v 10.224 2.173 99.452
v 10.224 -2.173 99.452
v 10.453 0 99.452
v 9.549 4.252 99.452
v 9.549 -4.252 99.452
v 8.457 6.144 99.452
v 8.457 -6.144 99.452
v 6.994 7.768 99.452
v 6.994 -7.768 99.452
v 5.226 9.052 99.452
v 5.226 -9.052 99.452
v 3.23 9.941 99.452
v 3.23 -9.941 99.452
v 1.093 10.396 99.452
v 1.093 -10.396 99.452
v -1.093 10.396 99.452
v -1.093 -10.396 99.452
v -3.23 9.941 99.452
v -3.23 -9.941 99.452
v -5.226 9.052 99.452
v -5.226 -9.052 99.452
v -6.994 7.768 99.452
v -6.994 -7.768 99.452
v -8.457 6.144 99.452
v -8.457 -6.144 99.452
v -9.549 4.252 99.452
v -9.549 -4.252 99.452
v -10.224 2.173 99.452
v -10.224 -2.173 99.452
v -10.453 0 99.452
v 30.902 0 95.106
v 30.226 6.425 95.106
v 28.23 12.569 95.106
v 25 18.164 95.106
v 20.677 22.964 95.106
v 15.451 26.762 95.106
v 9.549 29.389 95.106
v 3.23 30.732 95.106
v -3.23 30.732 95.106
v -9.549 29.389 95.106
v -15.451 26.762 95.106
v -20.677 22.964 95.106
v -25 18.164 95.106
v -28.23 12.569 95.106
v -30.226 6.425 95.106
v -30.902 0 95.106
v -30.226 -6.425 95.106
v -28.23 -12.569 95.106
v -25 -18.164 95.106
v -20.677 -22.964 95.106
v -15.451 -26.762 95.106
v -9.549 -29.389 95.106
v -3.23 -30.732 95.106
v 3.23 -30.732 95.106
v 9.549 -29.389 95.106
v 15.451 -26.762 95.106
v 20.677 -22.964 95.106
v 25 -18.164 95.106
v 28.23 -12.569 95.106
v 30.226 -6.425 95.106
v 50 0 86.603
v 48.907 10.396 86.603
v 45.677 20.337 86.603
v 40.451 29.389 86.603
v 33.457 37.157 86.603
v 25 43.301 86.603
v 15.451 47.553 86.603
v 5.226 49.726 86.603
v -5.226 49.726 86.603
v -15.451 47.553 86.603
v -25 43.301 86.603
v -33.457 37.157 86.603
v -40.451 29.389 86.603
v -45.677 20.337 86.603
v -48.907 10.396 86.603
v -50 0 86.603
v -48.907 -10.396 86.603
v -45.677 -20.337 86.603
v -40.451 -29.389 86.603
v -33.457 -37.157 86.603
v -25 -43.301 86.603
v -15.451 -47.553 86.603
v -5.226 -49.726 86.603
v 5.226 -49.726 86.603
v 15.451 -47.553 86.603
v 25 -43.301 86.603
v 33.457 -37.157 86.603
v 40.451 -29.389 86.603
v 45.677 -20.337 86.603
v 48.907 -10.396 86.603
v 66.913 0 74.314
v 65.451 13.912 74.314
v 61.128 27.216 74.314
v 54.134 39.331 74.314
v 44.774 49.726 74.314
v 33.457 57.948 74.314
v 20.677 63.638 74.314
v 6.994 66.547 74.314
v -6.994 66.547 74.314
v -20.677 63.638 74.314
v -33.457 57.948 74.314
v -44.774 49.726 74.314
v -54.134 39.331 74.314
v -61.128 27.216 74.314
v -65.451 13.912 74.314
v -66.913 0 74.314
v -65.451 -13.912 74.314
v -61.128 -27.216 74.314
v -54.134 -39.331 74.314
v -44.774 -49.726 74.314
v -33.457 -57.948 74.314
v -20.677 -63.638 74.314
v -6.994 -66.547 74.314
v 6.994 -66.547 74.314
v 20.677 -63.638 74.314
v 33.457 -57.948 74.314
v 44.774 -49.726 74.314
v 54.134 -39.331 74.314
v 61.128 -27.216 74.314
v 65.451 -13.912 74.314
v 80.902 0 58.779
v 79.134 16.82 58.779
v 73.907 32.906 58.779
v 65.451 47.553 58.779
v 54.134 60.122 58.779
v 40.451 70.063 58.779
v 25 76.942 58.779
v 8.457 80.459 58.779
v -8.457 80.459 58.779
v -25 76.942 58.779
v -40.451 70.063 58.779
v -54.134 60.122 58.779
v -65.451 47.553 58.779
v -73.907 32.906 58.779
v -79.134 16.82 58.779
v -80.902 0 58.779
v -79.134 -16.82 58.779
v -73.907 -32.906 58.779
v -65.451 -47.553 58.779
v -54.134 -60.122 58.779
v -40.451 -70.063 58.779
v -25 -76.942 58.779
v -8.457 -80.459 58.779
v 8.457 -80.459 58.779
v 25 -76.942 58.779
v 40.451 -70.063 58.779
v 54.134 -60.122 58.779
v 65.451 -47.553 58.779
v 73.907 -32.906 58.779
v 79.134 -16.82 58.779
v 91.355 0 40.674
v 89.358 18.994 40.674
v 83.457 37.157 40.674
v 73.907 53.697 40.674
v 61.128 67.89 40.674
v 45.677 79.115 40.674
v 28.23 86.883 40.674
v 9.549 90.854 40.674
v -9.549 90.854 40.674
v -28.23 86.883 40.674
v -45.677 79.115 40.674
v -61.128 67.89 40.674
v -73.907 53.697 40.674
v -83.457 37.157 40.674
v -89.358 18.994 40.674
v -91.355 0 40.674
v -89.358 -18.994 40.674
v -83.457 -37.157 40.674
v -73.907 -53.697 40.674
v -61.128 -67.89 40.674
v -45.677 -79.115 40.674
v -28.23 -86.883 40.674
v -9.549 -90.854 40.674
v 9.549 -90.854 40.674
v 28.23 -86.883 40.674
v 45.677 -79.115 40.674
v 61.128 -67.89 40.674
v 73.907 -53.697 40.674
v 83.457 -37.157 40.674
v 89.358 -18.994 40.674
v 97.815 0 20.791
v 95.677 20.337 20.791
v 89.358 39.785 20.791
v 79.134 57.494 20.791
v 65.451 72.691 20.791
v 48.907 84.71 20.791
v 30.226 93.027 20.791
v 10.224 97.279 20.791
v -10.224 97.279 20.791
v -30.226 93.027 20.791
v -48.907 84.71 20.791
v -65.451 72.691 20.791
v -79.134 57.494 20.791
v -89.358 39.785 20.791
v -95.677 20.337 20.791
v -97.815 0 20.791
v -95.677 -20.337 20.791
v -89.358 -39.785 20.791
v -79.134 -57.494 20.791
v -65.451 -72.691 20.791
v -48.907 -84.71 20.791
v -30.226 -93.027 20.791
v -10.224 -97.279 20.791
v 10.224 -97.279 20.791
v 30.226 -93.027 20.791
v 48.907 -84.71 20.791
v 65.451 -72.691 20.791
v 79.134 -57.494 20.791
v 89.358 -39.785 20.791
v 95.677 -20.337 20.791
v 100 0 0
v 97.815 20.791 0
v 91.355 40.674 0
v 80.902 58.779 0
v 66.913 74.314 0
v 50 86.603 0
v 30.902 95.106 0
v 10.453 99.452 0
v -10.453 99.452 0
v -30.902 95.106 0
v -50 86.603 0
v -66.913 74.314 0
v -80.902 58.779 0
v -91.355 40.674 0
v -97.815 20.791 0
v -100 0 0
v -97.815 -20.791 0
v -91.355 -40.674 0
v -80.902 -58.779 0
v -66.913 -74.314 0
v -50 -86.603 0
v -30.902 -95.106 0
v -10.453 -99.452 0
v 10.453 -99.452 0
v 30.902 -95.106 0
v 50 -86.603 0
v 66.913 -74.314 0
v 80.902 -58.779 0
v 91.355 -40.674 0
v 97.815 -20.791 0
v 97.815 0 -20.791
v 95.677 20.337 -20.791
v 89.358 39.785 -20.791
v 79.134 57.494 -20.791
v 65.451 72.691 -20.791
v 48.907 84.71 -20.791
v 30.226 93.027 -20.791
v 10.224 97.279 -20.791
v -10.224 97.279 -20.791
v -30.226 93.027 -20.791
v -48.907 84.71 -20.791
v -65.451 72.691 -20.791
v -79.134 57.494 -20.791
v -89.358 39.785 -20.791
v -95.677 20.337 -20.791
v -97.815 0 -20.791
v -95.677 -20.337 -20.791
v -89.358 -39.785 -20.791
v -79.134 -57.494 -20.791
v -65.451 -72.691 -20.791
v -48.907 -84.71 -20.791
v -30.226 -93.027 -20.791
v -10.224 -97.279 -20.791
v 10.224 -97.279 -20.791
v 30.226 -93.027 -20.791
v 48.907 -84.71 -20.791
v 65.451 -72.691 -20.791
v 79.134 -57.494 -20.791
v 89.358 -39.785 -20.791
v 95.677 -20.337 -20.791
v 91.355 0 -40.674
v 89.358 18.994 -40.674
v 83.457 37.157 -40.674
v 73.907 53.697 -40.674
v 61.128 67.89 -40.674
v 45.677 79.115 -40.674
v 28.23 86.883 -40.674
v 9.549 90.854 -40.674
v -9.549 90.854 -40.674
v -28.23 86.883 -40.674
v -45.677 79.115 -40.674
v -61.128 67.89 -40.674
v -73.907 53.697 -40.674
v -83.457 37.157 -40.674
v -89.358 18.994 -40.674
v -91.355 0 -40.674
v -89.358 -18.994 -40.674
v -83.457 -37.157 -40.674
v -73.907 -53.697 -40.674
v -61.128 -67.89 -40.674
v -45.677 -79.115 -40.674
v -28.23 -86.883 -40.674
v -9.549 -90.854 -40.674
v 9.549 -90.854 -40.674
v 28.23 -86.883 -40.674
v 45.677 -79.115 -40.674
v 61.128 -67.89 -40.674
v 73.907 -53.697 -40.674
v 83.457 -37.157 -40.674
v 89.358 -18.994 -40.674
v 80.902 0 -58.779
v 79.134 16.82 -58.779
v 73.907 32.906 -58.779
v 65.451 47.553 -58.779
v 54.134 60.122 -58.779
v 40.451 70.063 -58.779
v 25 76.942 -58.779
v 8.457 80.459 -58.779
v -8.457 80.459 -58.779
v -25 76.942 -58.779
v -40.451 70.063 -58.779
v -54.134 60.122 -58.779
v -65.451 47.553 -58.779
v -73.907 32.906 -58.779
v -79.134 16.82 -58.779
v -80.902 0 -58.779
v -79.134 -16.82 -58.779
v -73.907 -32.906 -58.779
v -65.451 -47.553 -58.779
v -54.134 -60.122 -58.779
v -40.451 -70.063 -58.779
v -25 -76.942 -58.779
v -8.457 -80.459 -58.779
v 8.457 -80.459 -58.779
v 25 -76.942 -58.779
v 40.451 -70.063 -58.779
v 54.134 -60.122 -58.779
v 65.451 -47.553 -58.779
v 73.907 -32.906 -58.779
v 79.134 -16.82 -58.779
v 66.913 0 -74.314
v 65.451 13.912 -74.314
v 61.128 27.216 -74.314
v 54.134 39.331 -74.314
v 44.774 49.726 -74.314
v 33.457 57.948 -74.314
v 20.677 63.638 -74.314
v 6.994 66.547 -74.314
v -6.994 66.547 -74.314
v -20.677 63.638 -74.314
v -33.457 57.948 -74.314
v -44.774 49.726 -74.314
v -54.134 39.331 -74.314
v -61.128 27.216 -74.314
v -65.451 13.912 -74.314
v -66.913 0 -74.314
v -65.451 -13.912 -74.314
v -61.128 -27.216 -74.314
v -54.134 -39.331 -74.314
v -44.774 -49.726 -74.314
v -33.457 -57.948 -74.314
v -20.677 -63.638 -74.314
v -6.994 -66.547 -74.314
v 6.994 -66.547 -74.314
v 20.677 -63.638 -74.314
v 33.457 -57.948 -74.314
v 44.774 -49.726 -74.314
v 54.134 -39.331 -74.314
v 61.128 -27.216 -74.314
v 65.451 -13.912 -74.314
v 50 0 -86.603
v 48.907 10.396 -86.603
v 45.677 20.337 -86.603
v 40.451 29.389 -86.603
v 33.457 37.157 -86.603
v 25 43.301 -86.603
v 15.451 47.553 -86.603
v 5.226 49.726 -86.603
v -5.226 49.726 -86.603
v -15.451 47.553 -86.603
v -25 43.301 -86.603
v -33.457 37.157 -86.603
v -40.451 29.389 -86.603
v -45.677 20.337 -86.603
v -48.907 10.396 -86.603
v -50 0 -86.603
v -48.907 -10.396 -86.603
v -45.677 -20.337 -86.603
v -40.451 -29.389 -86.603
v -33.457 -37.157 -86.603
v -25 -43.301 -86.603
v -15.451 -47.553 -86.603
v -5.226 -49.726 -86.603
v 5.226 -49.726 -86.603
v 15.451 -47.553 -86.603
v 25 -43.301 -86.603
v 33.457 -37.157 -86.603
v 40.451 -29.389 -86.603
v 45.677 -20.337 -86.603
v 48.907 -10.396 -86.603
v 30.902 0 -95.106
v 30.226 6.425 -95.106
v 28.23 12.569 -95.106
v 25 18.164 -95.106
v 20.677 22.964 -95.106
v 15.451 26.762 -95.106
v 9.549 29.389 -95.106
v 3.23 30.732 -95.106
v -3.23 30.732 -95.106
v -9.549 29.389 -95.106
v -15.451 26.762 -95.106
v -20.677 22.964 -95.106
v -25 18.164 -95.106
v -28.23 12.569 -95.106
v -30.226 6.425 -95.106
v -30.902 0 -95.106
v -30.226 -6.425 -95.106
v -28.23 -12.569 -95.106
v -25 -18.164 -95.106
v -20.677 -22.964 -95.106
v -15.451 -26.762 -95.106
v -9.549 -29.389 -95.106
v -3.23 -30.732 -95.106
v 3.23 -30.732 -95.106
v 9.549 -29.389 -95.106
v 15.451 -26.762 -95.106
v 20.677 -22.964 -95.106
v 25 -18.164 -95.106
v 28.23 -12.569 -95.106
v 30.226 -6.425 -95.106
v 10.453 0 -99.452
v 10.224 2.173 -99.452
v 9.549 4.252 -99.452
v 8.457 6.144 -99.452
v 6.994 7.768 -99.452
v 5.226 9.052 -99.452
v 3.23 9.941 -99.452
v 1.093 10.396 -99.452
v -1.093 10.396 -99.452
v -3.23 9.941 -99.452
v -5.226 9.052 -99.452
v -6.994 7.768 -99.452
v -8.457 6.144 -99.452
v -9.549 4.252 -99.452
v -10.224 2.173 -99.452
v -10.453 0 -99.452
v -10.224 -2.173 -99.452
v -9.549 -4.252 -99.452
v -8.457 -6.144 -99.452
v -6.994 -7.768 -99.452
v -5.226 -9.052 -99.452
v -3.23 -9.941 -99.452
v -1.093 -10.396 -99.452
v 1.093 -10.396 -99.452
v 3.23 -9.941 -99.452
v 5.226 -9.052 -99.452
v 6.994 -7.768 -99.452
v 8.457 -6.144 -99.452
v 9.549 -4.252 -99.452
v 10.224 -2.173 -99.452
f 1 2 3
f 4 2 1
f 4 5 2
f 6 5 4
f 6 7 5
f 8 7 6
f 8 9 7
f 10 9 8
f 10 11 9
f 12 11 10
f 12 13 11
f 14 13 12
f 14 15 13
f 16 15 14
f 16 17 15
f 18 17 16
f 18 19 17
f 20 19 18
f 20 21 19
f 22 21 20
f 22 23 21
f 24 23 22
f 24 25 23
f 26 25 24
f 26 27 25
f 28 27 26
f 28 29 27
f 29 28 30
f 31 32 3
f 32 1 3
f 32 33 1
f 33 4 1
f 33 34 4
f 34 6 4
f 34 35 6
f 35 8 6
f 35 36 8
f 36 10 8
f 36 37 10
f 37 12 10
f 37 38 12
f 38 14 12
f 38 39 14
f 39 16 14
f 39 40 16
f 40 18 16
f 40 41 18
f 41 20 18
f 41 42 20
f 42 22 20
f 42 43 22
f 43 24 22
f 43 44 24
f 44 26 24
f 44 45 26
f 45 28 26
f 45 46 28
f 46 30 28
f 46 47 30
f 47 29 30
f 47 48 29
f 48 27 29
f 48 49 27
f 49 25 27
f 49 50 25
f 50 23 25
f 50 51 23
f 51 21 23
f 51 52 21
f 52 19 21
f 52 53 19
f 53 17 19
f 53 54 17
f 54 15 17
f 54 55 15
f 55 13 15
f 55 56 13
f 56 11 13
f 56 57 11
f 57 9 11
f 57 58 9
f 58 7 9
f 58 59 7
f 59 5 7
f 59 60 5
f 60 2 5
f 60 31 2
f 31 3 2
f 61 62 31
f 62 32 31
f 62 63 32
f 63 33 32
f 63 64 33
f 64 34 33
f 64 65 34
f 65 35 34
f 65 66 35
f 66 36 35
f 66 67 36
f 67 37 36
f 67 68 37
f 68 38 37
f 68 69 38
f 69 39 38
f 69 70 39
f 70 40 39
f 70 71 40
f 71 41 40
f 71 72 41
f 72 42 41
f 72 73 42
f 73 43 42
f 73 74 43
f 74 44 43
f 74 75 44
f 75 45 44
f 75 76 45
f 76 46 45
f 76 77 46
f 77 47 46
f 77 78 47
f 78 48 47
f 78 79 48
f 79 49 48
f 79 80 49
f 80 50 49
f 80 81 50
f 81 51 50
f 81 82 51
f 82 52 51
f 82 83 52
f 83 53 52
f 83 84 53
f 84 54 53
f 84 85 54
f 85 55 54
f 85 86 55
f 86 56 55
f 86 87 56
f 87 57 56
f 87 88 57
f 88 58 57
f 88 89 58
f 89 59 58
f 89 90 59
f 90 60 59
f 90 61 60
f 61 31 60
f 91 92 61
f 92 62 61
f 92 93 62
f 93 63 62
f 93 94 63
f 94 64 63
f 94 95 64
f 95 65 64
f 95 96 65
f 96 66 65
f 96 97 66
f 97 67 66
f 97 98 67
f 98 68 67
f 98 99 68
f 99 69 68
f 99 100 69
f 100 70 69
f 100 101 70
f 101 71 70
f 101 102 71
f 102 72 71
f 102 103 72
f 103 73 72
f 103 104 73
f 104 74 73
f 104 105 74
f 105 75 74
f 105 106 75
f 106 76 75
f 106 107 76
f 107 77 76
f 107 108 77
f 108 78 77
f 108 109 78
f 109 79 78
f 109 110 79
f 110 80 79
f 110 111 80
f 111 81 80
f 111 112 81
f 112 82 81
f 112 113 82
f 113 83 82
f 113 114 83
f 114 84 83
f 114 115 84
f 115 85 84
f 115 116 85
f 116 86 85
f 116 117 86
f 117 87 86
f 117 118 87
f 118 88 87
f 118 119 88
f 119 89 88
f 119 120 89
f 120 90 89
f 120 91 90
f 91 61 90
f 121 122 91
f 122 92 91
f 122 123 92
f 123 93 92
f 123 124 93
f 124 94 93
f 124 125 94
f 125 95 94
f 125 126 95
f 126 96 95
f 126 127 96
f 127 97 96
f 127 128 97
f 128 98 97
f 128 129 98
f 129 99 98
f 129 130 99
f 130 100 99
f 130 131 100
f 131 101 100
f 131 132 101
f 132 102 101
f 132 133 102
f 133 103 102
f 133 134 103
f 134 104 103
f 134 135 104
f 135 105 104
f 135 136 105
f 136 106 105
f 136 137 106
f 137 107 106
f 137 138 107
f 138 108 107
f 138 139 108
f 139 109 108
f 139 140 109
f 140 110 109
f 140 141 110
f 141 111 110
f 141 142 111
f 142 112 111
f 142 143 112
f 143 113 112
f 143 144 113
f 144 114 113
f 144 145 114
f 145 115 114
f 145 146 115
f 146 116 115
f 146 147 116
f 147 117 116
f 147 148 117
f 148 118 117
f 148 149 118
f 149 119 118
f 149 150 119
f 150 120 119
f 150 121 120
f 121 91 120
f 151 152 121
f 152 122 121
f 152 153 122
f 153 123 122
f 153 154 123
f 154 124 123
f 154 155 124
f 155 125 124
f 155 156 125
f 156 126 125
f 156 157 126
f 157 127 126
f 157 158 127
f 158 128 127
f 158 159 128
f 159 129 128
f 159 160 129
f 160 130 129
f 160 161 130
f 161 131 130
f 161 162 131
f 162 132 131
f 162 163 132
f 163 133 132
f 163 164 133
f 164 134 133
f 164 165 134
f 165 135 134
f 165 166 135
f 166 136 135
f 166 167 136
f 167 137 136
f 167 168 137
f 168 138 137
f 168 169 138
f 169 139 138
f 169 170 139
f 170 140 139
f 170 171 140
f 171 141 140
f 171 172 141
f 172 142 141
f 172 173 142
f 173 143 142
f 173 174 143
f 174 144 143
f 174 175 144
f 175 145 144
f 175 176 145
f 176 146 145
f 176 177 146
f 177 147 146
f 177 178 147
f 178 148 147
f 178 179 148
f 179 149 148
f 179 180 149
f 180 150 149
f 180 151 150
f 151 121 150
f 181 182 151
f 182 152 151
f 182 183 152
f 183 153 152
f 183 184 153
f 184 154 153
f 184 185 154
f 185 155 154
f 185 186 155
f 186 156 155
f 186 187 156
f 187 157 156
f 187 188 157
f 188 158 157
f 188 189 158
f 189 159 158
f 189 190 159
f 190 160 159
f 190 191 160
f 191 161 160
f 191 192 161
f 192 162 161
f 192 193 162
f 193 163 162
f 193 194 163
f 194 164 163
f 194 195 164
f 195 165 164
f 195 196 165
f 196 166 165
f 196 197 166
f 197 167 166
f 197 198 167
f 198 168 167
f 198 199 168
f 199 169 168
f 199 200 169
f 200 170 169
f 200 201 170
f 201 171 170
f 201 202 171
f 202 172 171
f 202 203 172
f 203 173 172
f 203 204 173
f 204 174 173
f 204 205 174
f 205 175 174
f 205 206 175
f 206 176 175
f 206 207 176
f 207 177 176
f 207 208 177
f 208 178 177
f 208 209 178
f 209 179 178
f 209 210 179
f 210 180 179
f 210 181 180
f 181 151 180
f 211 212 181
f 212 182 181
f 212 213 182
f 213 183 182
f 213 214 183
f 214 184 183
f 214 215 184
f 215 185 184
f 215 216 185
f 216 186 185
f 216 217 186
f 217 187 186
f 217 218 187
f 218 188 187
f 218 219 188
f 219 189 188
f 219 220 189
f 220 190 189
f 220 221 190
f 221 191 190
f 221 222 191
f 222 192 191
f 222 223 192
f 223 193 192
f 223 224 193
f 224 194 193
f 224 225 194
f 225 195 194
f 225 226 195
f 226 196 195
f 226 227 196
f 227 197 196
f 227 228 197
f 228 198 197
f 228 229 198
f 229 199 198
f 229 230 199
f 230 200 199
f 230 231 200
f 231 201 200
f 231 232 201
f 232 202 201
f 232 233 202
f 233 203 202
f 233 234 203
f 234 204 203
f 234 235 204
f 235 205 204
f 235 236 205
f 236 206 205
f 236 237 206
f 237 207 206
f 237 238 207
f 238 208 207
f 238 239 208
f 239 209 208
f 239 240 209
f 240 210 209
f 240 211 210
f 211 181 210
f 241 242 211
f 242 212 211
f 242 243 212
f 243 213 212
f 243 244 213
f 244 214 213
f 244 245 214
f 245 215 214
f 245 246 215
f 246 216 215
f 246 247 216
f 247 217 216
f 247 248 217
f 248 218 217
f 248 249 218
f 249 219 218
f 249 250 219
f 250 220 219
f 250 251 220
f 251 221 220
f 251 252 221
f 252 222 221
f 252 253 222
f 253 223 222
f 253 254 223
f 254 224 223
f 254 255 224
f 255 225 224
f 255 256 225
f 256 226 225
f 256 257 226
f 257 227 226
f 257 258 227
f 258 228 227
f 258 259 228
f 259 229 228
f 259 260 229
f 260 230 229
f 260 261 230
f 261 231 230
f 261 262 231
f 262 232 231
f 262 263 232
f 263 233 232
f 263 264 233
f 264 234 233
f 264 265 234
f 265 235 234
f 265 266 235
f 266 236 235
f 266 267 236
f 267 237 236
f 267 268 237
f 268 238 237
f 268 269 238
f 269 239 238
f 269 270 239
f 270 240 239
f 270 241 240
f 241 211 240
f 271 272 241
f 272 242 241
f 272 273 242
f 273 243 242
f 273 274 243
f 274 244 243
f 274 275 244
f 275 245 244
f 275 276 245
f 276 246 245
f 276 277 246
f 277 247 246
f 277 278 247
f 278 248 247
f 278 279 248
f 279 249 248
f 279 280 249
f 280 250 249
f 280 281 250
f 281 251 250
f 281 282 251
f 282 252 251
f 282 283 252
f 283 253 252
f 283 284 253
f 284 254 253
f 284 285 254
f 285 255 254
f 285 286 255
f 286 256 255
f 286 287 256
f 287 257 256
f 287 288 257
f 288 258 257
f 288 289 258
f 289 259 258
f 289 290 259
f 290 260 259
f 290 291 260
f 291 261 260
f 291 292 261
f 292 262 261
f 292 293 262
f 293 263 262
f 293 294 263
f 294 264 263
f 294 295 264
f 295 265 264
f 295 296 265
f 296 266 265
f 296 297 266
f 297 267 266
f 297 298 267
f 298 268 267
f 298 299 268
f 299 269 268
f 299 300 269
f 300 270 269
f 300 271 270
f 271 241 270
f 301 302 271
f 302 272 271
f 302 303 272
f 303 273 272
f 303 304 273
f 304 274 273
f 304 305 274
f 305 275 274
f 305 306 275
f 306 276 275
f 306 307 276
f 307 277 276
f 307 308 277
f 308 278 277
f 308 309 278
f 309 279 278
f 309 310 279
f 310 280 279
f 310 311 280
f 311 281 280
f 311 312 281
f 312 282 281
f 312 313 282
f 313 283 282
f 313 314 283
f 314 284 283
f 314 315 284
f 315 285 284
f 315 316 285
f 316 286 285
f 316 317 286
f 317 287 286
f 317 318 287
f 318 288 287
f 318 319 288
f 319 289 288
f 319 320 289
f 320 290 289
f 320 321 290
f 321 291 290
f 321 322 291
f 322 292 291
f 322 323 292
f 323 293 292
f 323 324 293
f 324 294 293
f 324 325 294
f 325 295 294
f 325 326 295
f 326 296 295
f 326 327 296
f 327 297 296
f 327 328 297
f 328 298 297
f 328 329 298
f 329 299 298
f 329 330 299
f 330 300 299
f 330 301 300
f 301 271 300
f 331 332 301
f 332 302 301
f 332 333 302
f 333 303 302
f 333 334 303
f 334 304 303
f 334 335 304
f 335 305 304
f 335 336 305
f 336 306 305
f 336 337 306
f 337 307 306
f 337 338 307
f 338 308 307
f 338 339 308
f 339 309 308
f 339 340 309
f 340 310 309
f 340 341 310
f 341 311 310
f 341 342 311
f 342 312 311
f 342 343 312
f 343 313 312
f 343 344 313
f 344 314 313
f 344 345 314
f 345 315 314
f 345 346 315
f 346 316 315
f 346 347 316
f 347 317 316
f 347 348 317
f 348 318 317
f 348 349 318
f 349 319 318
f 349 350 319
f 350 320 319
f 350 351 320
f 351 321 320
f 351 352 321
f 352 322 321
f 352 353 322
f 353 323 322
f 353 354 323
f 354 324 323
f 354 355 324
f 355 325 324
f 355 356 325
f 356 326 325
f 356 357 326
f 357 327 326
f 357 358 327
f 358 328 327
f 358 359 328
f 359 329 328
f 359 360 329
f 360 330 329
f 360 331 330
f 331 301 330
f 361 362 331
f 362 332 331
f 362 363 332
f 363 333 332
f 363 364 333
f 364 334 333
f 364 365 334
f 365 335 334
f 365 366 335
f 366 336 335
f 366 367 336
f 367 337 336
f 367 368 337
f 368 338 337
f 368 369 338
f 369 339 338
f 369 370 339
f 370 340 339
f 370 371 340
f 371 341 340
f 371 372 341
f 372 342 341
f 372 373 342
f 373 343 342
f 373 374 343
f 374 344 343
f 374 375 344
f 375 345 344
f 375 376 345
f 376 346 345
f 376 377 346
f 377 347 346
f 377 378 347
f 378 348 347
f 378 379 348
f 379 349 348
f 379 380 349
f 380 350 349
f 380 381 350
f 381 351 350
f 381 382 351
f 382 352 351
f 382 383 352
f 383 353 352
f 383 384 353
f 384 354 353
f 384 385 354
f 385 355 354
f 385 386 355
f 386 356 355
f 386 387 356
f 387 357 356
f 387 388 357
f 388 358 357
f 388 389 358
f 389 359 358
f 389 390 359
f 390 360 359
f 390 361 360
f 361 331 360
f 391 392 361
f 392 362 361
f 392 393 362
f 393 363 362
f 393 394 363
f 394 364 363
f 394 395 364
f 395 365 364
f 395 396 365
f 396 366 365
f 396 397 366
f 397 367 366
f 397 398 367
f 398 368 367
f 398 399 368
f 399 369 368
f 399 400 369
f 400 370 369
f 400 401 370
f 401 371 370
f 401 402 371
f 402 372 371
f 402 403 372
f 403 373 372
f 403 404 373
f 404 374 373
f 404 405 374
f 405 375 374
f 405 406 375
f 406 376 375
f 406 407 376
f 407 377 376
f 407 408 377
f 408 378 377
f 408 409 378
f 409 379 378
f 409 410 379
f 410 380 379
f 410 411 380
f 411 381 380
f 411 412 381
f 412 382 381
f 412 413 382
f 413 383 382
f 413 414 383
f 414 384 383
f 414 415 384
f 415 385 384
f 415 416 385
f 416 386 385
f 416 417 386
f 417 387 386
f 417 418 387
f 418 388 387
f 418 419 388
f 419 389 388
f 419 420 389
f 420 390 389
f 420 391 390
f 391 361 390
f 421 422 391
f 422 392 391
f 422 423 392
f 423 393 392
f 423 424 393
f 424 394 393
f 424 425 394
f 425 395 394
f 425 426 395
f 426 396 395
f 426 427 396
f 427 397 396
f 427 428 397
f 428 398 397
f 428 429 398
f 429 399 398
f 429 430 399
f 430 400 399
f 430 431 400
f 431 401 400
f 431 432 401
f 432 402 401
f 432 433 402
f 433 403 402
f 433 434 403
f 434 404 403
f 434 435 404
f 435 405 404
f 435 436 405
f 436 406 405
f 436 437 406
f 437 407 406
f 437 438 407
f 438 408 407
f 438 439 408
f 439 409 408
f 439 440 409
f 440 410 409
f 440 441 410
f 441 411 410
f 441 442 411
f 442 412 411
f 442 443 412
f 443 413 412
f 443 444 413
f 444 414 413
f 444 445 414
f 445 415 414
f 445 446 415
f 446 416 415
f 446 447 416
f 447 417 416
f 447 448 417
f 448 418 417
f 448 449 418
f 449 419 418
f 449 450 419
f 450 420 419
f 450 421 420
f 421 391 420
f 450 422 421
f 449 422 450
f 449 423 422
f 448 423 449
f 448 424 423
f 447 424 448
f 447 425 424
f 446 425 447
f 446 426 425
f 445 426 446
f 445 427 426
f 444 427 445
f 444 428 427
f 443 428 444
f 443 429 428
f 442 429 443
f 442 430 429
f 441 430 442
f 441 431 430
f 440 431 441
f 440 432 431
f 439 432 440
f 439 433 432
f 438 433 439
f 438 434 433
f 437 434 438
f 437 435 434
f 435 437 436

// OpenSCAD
sphere_base = 100;

simple_sphere(sphere_base);

module simple_sphere(size){

    sphere(size);

}
